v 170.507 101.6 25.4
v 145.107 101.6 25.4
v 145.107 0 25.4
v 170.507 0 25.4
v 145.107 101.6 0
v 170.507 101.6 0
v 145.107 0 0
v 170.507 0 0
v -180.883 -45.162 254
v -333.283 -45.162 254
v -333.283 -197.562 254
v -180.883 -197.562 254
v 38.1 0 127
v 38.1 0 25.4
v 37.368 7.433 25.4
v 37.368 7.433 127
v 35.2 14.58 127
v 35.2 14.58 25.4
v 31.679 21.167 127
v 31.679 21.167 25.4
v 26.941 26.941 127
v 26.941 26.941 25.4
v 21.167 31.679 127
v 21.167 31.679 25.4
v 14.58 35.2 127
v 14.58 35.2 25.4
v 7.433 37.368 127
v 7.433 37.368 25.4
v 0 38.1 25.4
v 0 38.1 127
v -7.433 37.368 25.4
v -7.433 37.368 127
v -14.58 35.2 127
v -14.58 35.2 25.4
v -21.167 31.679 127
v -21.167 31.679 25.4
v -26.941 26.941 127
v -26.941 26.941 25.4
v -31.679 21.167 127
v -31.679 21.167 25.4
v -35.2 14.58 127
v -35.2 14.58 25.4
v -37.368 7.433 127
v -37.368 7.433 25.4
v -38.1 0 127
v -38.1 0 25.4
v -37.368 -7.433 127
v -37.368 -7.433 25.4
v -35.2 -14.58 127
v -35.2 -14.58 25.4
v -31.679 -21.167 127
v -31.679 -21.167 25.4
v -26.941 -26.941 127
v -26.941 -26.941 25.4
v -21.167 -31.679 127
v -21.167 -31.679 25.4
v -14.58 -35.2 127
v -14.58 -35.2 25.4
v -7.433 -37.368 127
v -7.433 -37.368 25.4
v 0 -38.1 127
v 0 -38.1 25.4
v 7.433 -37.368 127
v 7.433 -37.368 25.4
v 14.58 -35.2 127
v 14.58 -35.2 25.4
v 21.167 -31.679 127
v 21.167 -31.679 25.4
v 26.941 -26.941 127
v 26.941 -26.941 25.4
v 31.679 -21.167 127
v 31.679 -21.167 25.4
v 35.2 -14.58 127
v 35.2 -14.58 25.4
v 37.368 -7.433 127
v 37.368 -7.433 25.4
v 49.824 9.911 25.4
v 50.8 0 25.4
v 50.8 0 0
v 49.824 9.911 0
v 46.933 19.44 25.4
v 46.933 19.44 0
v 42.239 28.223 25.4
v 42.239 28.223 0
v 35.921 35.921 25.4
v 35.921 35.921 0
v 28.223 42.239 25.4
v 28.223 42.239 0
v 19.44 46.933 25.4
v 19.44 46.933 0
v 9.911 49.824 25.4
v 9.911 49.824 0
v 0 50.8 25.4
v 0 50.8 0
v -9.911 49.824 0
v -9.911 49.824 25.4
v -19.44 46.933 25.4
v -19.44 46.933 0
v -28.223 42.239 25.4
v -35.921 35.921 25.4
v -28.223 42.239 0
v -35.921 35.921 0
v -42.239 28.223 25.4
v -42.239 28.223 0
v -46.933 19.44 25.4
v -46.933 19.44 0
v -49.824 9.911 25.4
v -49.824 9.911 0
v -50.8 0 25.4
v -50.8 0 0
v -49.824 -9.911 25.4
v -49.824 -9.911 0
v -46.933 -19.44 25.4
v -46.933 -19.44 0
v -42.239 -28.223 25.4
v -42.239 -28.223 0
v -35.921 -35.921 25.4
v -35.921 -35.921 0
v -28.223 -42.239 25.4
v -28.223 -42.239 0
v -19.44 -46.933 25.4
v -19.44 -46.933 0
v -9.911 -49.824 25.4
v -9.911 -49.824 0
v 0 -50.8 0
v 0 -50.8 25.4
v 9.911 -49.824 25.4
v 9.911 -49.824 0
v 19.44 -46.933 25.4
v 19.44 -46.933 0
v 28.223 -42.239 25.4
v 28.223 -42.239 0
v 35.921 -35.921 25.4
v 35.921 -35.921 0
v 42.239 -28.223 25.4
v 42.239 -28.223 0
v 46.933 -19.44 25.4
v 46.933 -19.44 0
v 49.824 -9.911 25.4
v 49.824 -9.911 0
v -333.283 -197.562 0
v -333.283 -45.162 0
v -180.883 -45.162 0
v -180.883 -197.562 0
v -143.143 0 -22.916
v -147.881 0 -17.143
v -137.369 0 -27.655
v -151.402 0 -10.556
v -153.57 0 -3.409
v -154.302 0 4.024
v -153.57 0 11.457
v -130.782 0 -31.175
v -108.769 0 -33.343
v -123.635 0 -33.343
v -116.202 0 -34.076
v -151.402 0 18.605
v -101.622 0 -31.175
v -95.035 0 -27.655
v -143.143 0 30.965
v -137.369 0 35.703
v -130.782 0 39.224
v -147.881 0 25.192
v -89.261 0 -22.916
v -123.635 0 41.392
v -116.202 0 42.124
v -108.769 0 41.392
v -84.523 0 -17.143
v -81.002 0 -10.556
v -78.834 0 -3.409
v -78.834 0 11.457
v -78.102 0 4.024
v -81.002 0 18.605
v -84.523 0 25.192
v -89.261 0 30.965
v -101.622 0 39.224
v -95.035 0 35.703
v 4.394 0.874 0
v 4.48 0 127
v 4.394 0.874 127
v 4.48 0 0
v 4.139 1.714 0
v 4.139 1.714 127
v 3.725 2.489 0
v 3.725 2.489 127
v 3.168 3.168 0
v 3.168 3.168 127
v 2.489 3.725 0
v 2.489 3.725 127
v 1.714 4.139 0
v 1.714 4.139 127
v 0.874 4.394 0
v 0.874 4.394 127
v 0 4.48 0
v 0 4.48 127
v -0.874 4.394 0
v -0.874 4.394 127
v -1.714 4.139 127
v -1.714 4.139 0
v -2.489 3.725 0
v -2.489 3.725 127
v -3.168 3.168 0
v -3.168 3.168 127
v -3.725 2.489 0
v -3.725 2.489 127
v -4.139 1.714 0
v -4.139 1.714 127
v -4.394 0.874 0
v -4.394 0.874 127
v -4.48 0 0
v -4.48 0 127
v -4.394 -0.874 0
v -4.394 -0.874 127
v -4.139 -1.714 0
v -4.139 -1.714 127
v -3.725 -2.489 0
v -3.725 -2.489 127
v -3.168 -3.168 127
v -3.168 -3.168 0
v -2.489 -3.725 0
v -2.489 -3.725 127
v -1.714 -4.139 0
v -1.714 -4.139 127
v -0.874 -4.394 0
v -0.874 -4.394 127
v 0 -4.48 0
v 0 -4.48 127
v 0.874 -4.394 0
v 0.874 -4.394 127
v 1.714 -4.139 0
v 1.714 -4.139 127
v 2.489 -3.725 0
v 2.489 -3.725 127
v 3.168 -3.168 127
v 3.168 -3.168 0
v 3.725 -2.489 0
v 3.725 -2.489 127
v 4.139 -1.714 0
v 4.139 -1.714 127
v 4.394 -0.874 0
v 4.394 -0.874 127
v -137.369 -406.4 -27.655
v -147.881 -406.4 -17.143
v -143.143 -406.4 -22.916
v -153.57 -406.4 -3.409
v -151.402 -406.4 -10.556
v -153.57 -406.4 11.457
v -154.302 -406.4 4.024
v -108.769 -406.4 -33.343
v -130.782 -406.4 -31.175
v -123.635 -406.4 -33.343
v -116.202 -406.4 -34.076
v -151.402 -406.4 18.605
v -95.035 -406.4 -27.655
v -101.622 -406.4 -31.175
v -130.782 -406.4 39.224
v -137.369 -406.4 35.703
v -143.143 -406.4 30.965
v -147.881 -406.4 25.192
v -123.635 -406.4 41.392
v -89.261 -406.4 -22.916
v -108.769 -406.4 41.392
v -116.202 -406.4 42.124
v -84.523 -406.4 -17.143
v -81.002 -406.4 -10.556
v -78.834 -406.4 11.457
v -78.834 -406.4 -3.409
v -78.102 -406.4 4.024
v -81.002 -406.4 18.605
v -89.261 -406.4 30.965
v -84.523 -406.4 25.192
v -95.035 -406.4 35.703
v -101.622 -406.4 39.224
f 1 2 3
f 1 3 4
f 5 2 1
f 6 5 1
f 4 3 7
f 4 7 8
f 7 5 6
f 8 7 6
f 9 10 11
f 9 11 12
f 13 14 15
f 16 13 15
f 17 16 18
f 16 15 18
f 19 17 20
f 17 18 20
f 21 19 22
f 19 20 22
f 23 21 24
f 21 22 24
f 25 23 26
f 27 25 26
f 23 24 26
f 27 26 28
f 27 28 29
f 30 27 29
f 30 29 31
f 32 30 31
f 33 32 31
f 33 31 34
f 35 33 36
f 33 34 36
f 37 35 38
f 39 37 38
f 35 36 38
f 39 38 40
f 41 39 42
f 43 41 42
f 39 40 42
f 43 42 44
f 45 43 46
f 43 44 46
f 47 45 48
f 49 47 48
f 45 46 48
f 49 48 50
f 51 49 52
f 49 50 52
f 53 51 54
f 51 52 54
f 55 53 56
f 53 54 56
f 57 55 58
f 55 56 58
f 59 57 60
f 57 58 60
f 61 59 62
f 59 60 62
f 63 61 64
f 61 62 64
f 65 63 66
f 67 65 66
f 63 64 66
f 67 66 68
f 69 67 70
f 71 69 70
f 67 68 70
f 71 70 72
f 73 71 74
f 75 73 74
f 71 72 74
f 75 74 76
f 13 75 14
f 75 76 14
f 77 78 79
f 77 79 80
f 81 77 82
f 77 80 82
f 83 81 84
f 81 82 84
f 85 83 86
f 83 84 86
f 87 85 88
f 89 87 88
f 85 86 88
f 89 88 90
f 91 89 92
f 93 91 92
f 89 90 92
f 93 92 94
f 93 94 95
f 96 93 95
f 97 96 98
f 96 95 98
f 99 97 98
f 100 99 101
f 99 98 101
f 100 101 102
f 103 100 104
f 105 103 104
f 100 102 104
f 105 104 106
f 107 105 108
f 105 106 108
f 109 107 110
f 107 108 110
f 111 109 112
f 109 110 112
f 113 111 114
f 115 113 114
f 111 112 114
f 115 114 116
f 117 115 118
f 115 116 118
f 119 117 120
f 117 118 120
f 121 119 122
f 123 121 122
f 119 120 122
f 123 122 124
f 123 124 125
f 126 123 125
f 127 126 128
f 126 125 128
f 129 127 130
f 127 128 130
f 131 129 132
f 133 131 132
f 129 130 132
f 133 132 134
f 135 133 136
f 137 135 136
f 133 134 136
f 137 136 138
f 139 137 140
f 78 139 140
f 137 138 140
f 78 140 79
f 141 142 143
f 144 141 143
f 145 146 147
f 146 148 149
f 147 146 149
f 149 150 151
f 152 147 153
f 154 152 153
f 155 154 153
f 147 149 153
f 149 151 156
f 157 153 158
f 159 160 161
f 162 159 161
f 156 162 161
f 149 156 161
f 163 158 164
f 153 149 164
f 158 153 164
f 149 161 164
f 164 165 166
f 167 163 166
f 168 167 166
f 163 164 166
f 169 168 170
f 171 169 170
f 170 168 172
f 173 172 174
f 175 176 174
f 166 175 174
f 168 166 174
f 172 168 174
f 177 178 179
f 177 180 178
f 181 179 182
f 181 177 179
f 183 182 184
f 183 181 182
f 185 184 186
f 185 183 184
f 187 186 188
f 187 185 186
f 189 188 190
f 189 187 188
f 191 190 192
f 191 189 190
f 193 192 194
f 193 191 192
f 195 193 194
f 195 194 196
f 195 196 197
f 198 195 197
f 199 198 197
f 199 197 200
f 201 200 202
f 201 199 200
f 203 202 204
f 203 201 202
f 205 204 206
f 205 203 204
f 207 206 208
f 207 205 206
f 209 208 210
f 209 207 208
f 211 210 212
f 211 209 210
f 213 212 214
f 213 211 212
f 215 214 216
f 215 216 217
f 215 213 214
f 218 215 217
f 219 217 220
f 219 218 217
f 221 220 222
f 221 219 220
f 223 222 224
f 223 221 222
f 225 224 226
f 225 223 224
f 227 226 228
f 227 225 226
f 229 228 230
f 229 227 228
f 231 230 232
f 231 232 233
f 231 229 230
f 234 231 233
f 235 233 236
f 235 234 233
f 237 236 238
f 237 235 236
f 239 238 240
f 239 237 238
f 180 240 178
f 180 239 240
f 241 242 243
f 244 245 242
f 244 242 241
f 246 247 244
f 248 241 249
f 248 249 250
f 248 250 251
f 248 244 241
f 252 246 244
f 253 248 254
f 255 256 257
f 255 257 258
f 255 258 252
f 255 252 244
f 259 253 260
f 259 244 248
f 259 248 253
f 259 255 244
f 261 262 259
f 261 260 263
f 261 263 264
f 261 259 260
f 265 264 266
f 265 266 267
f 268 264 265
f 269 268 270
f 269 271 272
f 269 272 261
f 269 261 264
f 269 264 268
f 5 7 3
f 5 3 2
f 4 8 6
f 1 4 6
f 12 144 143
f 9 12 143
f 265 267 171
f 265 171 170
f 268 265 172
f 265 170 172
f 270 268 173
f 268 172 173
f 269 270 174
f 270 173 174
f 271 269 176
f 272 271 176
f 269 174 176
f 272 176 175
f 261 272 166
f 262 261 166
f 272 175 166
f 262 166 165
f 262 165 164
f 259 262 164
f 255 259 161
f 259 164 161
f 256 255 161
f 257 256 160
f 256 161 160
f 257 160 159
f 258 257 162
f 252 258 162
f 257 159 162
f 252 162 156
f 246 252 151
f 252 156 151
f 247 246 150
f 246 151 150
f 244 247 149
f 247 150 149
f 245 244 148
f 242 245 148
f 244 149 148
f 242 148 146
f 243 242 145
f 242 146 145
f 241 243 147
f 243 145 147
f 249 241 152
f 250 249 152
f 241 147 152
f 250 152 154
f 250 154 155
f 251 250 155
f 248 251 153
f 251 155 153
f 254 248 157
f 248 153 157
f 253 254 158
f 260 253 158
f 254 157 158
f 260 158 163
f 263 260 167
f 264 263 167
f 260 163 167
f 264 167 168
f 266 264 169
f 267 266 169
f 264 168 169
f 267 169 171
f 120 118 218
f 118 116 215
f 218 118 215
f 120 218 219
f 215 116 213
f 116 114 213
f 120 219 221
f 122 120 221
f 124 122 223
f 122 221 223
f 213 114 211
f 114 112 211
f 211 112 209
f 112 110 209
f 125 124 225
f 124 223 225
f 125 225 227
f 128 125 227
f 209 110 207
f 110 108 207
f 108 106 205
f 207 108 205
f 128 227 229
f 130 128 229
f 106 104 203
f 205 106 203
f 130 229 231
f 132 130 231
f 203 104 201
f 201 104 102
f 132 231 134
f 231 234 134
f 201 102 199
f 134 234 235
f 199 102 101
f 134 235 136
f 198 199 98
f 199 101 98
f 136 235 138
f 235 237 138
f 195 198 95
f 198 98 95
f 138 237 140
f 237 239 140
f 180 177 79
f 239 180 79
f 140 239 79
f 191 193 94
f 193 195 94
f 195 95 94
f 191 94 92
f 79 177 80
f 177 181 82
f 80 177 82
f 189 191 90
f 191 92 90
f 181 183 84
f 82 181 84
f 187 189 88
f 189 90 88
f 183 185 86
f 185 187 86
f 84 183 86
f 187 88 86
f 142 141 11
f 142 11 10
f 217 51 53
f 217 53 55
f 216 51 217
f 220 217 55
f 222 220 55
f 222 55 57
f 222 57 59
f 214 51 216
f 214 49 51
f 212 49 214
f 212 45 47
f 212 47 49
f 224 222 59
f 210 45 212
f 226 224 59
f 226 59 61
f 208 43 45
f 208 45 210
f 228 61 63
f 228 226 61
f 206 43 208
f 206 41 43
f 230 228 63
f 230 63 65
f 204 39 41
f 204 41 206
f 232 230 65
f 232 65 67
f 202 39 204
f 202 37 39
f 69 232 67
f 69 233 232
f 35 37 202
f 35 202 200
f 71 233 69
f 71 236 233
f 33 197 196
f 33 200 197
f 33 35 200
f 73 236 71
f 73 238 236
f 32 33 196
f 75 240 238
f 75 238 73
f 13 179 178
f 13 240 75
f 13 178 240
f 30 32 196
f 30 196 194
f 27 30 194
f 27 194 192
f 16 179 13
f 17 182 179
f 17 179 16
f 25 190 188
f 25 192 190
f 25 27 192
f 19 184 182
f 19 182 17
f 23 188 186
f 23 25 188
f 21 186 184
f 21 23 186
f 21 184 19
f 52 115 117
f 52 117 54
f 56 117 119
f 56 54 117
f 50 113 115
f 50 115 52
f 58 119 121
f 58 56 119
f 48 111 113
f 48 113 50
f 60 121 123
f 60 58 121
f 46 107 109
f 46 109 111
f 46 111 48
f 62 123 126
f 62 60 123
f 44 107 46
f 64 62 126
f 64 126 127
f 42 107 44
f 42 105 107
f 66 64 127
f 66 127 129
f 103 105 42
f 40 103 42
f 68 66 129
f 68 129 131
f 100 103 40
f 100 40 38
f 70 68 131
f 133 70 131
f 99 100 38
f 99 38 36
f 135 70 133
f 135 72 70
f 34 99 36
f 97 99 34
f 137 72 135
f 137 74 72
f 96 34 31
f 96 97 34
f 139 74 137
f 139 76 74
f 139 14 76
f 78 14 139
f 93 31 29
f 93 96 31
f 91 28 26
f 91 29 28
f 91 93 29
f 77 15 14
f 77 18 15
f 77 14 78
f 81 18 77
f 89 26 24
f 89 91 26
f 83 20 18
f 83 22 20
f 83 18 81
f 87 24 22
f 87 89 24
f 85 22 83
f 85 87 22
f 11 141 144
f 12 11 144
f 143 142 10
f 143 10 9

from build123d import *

# Parameters (mm, degrees)
F0_R     = 50.8
F0_R_2   = 4.479842
F1_DEPTH = 25.4
F2_R     = 38.1
F3_DEPTH = 406.4
F4_W     = 152.4
F4_H     = 152.4
F5_DEPTH = 254
F6_R     = 38.1
F6_R_2   = 4.479842
F7_DEPTH = 101.6
F8_W     = 25.4
F8_H     = 101.6
F9_DEPTH = 25.4


with BuildPart() as f1:
    # F0 (on Top) → F1 (new body)
    with BuildSketch(Plane.XY):
        Circle(F0_R)
        Circle(F0_R_2, mode=Mode.SUBTRACT)
    extrude(amount=F1_DEPTH)

    # F6 (on face) → F7 (join)
    with BuildSketch(Plane.XY.offset(25.4)):
        Circle(F6_R)
        Circle(F6_R_2, mode=Mode.SUBTRACT)
    extrude(amount=F7_DEPTH)


with BuildPart() as f3:
    # F2 (on Front) → F3 (new body)
    with BuildSketch(Plane.XZ):
        with Locations((-116.20196, 4.024441)):
            Circle(F2_R)
    extrude(amount=F3_DEPTH)


with BuildPart() as f5:
    # F4 (on Top) → F5 (new body)
    with BuildSketch(Plane.XY):
        with Locations((-257.083073, -121.361681)):
            Rectangle(F4_W, F4_H)
    extrude(amount=F5_DEPTH)


with BuildPart() as f9:
    # F8 (on Top) → F9 (new body)
    with BuildSketch(Plane.XY):
        with Locations((157.806885, 50.8)):
            Rectangle(F8_W, F8_H)
    extrude(amount=F9_DEPTH)


solid = Compound([f1.part, f3.part, f5.part, f9.part])
